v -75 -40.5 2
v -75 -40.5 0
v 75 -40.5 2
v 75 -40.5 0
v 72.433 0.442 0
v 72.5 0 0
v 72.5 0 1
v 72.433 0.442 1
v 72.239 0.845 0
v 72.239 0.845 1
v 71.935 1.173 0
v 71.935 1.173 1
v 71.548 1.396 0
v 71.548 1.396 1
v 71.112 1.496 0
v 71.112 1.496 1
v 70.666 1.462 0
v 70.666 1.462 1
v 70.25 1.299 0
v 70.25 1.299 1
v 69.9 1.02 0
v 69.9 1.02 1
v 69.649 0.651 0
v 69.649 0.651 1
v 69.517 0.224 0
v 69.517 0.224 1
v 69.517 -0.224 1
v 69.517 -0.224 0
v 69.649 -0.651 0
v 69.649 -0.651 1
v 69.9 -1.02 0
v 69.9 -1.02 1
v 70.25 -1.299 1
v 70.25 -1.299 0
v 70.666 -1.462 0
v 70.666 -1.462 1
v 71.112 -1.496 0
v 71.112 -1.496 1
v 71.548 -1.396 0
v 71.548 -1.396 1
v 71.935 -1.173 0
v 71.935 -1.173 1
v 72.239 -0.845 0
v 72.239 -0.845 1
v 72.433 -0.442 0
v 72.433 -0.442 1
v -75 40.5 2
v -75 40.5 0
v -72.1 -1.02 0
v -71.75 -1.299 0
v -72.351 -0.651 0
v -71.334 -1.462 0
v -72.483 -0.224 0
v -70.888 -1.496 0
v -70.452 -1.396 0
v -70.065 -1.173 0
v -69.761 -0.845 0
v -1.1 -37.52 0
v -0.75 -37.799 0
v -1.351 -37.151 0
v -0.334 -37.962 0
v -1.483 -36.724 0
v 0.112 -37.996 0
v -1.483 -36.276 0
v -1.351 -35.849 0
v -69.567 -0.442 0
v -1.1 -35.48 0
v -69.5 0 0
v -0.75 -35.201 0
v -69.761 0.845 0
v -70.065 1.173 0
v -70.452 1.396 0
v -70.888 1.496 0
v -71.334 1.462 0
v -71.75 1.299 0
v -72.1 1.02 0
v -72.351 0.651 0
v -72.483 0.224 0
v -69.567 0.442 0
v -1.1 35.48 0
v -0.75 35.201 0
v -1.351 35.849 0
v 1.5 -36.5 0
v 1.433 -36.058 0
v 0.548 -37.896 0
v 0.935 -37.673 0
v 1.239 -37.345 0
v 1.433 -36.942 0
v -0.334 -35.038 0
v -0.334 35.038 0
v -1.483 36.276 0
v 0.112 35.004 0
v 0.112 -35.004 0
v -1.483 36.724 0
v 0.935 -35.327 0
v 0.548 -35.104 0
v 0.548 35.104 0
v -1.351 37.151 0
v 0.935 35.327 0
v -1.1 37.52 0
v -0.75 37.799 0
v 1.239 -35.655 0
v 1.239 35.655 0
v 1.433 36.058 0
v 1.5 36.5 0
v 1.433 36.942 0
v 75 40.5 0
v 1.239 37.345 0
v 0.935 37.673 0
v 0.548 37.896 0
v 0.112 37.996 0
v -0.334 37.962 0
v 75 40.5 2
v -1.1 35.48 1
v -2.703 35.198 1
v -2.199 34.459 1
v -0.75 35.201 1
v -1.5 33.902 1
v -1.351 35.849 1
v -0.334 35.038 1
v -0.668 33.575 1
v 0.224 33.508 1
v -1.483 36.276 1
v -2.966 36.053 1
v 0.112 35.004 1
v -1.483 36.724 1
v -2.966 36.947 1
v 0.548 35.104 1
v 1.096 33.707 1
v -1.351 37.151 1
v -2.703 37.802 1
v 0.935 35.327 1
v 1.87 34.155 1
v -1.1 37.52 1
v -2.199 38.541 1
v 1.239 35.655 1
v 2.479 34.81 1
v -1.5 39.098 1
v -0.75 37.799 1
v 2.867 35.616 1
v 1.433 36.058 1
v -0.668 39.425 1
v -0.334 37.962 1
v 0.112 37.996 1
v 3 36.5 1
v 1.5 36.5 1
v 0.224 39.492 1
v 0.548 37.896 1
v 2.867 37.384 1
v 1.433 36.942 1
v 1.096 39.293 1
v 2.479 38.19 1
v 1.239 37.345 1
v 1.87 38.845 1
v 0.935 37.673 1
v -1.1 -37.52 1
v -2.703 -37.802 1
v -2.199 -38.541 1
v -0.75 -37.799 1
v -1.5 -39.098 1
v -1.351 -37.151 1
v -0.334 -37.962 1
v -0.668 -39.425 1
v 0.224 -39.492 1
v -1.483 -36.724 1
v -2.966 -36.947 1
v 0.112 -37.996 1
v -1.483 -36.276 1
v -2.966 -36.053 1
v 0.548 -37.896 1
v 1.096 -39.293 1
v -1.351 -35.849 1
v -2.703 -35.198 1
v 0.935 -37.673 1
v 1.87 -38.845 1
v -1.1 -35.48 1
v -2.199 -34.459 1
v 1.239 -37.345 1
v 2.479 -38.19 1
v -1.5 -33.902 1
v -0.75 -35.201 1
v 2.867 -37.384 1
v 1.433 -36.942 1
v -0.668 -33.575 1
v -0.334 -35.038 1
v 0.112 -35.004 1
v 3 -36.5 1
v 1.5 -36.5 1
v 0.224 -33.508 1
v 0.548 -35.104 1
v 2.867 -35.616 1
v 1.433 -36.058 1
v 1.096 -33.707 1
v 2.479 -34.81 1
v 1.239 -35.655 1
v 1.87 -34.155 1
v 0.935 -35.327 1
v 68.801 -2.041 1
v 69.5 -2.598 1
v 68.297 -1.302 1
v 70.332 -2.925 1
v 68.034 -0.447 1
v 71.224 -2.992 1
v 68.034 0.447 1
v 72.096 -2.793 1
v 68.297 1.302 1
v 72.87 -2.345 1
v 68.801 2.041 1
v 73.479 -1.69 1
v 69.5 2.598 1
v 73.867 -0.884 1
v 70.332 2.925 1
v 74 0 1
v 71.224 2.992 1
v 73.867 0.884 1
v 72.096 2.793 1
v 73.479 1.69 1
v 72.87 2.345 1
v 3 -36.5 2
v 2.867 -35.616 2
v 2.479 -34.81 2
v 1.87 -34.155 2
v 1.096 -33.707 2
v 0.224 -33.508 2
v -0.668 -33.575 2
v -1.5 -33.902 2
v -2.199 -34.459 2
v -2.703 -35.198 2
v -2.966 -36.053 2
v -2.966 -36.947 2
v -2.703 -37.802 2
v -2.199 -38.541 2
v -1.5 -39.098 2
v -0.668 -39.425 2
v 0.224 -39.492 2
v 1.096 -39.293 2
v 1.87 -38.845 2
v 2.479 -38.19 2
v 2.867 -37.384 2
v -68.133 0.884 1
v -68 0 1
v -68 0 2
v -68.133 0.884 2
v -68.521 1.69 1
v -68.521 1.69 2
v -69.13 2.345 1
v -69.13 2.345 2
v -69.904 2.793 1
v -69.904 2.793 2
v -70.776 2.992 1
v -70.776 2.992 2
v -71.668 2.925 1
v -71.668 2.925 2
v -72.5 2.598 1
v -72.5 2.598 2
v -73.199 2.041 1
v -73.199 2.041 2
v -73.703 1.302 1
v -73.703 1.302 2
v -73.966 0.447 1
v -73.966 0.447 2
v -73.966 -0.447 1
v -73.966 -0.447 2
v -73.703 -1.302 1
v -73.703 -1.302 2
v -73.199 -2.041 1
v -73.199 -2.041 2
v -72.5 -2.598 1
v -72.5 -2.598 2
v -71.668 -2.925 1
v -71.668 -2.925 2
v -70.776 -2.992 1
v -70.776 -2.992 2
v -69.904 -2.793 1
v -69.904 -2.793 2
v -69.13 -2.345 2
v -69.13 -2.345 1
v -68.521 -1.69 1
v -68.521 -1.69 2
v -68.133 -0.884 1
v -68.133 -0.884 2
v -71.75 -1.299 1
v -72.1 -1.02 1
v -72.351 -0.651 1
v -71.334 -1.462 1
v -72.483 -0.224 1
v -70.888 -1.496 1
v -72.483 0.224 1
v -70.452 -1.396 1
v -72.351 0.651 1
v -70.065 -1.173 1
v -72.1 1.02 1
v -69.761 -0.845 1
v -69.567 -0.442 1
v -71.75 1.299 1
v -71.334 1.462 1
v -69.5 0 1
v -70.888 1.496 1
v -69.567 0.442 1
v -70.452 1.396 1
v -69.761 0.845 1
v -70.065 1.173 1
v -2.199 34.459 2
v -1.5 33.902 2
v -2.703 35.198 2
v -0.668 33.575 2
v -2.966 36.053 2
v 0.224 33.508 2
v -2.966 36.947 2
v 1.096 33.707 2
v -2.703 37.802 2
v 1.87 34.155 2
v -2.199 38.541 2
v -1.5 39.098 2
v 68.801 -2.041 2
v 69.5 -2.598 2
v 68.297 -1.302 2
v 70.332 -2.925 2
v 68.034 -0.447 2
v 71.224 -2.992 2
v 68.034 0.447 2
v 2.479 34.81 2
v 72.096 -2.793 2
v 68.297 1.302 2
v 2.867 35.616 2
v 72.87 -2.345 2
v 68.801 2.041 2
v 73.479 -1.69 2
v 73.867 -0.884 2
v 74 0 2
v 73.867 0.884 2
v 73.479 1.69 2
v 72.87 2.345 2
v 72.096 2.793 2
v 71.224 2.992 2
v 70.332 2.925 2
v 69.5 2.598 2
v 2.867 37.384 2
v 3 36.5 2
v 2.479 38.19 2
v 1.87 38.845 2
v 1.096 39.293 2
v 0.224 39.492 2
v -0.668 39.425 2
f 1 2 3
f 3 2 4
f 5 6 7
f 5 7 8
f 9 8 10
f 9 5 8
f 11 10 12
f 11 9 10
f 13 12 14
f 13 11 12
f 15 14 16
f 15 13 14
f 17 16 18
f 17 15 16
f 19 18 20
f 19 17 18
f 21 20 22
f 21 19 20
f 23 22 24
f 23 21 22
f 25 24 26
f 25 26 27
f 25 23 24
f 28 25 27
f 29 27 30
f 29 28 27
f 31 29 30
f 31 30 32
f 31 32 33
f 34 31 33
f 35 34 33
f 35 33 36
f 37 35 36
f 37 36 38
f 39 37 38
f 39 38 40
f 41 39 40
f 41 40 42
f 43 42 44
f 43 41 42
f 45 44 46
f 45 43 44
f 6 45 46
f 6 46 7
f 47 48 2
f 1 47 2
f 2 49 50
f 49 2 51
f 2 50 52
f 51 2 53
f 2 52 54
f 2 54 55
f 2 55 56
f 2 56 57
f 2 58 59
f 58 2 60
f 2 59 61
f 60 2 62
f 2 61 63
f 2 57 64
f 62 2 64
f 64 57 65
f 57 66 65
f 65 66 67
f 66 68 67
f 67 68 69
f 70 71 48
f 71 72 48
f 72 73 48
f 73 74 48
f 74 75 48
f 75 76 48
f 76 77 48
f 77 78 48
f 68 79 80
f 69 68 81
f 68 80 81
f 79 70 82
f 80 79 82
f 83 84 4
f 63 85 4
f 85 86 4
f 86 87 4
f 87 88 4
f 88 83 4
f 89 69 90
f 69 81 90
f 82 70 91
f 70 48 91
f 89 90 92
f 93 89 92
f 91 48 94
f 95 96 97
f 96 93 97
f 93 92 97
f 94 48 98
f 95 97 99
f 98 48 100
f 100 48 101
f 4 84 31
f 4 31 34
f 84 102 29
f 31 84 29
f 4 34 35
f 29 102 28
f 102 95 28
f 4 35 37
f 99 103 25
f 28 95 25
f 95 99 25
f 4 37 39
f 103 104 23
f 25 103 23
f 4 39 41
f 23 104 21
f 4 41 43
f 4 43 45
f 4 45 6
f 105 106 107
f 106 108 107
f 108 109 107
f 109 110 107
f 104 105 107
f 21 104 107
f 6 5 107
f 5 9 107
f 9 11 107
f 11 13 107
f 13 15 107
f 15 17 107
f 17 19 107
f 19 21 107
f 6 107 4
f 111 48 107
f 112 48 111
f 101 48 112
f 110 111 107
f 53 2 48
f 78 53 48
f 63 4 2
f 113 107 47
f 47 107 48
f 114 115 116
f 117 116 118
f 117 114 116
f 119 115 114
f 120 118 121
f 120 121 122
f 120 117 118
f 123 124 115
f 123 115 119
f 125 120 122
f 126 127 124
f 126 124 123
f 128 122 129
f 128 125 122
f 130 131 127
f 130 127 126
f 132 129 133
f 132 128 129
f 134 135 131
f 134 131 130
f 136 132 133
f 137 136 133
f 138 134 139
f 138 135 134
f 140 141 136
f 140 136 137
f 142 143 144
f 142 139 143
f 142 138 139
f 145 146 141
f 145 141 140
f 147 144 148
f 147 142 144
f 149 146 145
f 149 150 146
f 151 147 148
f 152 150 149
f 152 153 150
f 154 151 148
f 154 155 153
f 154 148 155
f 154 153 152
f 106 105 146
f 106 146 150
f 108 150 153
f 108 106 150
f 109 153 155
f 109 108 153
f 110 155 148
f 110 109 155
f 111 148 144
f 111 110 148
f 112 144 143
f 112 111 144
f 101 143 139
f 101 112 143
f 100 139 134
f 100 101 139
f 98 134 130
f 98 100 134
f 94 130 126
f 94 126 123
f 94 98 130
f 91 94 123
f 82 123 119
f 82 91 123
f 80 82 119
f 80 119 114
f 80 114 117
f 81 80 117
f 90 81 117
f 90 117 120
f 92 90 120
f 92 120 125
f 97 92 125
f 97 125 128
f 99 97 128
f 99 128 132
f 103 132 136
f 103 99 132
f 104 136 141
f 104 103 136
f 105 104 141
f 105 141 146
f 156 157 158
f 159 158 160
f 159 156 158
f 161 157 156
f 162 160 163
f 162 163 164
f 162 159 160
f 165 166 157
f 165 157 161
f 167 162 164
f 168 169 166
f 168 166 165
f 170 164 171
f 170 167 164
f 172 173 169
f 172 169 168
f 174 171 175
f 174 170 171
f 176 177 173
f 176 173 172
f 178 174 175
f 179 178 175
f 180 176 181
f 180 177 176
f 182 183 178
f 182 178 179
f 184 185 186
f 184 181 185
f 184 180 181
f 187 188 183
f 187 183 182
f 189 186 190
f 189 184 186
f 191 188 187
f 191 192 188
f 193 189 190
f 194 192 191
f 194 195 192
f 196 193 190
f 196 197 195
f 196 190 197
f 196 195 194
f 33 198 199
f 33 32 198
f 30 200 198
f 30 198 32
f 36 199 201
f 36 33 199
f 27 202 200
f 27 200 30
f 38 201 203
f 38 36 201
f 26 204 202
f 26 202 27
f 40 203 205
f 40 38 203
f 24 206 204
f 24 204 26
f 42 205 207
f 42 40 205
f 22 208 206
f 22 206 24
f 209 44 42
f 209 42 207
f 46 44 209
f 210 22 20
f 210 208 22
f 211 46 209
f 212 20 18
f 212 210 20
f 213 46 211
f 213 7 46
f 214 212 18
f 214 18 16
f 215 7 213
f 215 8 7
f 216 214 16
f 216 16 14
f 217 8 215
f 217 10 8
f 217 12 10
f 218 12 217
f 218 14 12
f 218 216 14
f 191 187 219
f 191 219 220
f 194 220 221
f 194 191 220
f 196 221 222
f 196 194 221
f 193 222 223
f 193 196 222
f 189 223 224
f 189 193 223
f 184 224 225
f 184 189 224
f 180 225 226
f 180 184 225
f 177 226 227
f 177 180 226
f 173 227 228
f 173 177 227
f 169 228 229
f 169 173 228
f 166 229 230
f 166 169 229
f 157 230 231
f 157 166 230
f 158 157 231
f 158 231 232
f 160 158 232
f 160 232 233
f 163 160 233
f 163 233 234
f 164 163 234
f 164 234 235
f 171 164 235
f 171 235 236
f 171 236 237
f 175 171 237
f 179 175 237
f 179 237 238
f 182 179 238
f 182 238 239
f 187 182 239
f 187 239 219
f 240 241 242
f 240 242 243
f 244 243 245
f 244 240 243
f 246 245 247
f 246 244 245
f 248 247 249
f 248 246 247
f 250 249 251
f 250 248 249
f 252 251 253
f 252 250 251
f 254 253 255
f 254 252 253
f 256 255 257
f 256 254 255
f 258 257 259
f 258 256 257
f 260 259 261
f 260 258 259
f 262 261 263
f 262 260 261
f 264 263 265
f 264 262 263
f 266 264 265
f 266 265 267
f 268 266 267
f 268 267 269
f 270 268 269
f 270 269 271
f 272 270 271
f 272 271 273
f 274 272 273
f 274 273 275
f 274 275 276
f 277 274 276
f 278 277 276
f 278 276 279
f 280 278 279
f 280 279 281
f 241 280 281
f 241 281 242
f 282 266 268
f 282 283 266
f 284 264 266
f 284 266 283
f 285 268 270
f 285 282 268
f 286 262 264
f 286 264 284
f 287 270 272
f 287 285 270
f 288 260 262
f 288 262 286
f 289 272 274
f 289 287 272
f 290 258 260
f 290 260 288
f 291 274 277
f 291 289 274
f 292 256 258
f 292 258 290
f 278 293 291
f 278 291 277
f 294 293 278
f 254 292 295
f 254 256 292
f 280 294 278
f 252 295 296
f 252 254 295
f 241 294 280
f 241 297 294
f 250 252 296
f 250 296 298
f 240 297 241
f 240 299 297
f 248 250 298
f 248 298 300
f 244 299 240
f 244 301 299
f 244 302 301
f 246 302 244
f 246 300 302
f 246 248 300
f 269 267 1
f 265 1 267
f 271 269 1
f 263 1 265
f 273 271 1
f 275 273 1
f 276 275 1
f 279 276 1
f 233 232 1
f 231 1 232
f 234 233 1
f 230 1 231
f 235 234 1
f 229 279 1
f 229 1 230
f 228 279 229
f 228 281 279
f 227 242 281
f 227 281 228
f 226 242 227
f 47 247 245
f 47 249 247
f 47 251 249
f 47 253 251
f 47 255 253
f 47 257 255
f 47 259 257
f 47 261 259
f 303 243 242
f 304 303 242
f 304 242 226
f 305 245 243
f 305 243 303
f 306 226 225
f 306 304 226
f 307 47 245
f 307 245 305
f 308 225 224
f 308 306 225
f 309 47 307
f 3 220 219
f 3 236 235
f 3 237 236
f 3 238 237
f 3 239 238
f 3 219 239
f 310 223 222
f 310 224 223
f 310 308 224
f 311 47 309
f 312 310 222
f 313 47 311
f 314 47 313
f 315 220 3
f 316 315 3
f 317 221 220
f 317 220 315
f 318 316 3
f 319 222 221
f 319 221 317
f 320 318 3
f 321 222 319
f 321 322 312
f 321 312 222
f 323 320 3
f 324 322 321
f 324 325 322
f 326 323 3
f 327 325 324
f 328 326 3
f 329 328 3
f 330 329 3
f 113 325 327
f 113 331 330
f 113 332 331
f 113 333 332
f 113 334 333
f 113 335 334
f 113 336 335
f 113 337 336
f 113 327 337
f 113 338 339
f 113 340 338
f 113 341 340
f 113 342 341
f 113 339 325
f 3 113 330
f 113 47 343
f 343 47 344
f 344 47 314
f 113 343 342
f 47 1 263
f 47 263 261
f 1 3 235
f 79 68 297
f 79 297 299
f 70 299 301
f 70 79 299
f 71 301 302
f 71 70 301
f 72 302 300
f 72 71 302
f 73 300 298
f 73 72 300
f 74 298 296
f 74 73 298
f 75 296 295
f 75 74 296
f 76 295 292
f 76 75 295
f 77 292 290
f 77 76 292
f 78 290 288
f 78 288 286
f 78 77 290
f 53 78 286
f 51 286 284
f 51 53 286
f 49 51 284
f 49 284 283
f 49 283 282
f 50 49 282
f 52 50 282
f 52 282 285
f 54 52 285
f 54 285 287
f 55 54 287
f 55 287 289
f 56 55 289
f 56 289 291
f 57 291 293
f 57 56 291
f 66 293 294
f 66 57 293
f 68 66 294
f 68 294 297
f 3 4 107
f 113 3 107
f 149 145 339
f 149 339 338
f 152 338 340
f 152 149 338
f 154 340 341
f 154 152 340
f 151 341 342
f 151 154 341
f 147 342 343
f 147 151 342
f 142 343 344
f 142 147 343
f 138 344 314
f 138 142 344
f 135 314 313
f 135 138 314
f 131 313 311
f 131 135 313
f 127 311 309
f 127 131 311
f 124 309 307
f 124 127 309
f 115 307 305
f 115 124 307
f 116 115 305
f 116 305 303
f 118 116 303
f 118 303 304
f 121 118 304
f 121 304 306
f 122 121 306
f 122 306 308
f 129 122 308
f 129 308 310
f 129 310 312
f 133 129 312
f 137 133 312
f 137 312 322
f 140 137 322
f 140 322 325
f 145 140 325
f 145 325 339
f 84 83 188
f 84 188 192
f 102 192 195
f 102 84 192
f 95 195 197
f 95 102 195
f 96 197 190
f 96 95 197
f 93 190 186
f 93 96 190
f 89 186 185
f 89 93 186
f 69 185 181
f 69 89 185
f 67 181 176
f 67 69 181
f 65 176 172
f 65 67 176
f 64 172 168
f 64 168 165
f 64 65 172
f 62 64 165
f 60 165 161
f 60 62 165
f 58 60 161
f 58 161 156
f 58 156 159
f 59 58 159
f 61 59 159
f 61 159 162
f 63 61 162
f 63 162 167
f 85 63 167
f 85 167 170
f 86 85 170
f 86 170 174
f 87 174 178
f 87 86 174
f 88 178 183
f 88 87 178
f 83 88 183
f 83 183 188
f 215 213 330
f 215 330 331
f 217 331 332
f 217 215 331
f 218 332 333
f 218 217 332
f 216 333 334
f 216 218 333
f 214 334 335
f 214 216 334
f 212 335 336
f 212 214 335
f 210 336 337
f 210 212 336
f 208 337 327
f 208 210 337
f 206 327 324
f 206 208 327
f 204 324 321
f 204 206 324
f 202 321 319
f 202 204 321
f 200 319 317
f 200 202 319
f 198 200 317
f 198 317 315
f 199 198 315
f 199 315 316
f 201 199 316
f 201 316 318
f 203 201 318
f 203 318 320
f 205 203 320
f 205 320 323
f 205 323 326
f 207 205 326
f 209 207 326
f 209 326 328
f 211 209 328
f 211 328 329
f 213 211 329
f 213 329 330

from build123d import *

# Parameters (mm, degrees)
F0_W     = 8
F0_H     = 8
F0_R     = 3
F1_DEPTH = 2
F0_R_2   = 1.5
F2_DEPTH = 1


# Not quite as in the source:
# - a feature names something its author has since deleted; it is built from what else it names


with BuildPart() as f1:
    # F0 (on Top) → F1 (new body)
    with BuildSketch(Plane.XY):
        Polygon((4, -40.5), (75, -40.5), (75, -4), (67, -4), (67, 4), (75, 4), (75, 40.5), (4, 40.5), (4, 32.5), (-4, 32.5), (-4, 40.5), (-75, 40.5), (-75, 4), (-67, 4), (-67, -4), (-75, -4), (-75, -40.5), (-4, -40.5), (-4, -32.5), (4, -32.5), align=None)
        with Locations((-71, 0)):
            Rectangle(F0_W, F0_H)
        with Locations((-71, 0)):
            Circle(F0_R, mode=Mode.SUBTRACT)
        with Locations((0, 36.5)):
            Rectangle(F0_W, F0_H)
        with Locations((0, 36.5)):
            Circle(F0_R, mode=Mode.SUBTRACT)
        with Locations((71, 0)):
            Rectangle(F0_W, F0_H)
        with Locations((71, 0)):
            Circle(F0_R, mode=Mode.SUBTRACT)
        with Locations((0, -36.5)):
            Rectangle(F0_W, F0_H)
        with Locations((0, -36.5)):
            Circle(F0_R, mode=Mode.SUBTRACT)
    extrude(amount=F1_DEPTH)

    # F0 (on Top) → F2 (join)
    with BuildSketch(Plane.XY):
        with Locations((0, 36.5)):
            Circle(F0_R)
        with Locations((0, 36.5)):
            Circle(F0_R_2, mode=Mode.SUBTRACT)
        with Locations((71, 0)):
            Circle(F0_R)
        with Locations((71, 0)):
            Circle(F0_R_2, mode=Mode.SUBTRACT)
        with Locations((0, -36.5)):
            Circle(F0_R)
        with Locations((0, -36.5)):
            Circle(F0_R_2, mode=Mode.SUBTRACT)
        with Locations((-71, 0)):
            Circle(F0_R)
        with Locations((-71, 0)):
            Circle(F0_R_2, mode=Mode.SUBTRACT)
    extrude(amount=F2_DEPTH)


solid = f1.part
